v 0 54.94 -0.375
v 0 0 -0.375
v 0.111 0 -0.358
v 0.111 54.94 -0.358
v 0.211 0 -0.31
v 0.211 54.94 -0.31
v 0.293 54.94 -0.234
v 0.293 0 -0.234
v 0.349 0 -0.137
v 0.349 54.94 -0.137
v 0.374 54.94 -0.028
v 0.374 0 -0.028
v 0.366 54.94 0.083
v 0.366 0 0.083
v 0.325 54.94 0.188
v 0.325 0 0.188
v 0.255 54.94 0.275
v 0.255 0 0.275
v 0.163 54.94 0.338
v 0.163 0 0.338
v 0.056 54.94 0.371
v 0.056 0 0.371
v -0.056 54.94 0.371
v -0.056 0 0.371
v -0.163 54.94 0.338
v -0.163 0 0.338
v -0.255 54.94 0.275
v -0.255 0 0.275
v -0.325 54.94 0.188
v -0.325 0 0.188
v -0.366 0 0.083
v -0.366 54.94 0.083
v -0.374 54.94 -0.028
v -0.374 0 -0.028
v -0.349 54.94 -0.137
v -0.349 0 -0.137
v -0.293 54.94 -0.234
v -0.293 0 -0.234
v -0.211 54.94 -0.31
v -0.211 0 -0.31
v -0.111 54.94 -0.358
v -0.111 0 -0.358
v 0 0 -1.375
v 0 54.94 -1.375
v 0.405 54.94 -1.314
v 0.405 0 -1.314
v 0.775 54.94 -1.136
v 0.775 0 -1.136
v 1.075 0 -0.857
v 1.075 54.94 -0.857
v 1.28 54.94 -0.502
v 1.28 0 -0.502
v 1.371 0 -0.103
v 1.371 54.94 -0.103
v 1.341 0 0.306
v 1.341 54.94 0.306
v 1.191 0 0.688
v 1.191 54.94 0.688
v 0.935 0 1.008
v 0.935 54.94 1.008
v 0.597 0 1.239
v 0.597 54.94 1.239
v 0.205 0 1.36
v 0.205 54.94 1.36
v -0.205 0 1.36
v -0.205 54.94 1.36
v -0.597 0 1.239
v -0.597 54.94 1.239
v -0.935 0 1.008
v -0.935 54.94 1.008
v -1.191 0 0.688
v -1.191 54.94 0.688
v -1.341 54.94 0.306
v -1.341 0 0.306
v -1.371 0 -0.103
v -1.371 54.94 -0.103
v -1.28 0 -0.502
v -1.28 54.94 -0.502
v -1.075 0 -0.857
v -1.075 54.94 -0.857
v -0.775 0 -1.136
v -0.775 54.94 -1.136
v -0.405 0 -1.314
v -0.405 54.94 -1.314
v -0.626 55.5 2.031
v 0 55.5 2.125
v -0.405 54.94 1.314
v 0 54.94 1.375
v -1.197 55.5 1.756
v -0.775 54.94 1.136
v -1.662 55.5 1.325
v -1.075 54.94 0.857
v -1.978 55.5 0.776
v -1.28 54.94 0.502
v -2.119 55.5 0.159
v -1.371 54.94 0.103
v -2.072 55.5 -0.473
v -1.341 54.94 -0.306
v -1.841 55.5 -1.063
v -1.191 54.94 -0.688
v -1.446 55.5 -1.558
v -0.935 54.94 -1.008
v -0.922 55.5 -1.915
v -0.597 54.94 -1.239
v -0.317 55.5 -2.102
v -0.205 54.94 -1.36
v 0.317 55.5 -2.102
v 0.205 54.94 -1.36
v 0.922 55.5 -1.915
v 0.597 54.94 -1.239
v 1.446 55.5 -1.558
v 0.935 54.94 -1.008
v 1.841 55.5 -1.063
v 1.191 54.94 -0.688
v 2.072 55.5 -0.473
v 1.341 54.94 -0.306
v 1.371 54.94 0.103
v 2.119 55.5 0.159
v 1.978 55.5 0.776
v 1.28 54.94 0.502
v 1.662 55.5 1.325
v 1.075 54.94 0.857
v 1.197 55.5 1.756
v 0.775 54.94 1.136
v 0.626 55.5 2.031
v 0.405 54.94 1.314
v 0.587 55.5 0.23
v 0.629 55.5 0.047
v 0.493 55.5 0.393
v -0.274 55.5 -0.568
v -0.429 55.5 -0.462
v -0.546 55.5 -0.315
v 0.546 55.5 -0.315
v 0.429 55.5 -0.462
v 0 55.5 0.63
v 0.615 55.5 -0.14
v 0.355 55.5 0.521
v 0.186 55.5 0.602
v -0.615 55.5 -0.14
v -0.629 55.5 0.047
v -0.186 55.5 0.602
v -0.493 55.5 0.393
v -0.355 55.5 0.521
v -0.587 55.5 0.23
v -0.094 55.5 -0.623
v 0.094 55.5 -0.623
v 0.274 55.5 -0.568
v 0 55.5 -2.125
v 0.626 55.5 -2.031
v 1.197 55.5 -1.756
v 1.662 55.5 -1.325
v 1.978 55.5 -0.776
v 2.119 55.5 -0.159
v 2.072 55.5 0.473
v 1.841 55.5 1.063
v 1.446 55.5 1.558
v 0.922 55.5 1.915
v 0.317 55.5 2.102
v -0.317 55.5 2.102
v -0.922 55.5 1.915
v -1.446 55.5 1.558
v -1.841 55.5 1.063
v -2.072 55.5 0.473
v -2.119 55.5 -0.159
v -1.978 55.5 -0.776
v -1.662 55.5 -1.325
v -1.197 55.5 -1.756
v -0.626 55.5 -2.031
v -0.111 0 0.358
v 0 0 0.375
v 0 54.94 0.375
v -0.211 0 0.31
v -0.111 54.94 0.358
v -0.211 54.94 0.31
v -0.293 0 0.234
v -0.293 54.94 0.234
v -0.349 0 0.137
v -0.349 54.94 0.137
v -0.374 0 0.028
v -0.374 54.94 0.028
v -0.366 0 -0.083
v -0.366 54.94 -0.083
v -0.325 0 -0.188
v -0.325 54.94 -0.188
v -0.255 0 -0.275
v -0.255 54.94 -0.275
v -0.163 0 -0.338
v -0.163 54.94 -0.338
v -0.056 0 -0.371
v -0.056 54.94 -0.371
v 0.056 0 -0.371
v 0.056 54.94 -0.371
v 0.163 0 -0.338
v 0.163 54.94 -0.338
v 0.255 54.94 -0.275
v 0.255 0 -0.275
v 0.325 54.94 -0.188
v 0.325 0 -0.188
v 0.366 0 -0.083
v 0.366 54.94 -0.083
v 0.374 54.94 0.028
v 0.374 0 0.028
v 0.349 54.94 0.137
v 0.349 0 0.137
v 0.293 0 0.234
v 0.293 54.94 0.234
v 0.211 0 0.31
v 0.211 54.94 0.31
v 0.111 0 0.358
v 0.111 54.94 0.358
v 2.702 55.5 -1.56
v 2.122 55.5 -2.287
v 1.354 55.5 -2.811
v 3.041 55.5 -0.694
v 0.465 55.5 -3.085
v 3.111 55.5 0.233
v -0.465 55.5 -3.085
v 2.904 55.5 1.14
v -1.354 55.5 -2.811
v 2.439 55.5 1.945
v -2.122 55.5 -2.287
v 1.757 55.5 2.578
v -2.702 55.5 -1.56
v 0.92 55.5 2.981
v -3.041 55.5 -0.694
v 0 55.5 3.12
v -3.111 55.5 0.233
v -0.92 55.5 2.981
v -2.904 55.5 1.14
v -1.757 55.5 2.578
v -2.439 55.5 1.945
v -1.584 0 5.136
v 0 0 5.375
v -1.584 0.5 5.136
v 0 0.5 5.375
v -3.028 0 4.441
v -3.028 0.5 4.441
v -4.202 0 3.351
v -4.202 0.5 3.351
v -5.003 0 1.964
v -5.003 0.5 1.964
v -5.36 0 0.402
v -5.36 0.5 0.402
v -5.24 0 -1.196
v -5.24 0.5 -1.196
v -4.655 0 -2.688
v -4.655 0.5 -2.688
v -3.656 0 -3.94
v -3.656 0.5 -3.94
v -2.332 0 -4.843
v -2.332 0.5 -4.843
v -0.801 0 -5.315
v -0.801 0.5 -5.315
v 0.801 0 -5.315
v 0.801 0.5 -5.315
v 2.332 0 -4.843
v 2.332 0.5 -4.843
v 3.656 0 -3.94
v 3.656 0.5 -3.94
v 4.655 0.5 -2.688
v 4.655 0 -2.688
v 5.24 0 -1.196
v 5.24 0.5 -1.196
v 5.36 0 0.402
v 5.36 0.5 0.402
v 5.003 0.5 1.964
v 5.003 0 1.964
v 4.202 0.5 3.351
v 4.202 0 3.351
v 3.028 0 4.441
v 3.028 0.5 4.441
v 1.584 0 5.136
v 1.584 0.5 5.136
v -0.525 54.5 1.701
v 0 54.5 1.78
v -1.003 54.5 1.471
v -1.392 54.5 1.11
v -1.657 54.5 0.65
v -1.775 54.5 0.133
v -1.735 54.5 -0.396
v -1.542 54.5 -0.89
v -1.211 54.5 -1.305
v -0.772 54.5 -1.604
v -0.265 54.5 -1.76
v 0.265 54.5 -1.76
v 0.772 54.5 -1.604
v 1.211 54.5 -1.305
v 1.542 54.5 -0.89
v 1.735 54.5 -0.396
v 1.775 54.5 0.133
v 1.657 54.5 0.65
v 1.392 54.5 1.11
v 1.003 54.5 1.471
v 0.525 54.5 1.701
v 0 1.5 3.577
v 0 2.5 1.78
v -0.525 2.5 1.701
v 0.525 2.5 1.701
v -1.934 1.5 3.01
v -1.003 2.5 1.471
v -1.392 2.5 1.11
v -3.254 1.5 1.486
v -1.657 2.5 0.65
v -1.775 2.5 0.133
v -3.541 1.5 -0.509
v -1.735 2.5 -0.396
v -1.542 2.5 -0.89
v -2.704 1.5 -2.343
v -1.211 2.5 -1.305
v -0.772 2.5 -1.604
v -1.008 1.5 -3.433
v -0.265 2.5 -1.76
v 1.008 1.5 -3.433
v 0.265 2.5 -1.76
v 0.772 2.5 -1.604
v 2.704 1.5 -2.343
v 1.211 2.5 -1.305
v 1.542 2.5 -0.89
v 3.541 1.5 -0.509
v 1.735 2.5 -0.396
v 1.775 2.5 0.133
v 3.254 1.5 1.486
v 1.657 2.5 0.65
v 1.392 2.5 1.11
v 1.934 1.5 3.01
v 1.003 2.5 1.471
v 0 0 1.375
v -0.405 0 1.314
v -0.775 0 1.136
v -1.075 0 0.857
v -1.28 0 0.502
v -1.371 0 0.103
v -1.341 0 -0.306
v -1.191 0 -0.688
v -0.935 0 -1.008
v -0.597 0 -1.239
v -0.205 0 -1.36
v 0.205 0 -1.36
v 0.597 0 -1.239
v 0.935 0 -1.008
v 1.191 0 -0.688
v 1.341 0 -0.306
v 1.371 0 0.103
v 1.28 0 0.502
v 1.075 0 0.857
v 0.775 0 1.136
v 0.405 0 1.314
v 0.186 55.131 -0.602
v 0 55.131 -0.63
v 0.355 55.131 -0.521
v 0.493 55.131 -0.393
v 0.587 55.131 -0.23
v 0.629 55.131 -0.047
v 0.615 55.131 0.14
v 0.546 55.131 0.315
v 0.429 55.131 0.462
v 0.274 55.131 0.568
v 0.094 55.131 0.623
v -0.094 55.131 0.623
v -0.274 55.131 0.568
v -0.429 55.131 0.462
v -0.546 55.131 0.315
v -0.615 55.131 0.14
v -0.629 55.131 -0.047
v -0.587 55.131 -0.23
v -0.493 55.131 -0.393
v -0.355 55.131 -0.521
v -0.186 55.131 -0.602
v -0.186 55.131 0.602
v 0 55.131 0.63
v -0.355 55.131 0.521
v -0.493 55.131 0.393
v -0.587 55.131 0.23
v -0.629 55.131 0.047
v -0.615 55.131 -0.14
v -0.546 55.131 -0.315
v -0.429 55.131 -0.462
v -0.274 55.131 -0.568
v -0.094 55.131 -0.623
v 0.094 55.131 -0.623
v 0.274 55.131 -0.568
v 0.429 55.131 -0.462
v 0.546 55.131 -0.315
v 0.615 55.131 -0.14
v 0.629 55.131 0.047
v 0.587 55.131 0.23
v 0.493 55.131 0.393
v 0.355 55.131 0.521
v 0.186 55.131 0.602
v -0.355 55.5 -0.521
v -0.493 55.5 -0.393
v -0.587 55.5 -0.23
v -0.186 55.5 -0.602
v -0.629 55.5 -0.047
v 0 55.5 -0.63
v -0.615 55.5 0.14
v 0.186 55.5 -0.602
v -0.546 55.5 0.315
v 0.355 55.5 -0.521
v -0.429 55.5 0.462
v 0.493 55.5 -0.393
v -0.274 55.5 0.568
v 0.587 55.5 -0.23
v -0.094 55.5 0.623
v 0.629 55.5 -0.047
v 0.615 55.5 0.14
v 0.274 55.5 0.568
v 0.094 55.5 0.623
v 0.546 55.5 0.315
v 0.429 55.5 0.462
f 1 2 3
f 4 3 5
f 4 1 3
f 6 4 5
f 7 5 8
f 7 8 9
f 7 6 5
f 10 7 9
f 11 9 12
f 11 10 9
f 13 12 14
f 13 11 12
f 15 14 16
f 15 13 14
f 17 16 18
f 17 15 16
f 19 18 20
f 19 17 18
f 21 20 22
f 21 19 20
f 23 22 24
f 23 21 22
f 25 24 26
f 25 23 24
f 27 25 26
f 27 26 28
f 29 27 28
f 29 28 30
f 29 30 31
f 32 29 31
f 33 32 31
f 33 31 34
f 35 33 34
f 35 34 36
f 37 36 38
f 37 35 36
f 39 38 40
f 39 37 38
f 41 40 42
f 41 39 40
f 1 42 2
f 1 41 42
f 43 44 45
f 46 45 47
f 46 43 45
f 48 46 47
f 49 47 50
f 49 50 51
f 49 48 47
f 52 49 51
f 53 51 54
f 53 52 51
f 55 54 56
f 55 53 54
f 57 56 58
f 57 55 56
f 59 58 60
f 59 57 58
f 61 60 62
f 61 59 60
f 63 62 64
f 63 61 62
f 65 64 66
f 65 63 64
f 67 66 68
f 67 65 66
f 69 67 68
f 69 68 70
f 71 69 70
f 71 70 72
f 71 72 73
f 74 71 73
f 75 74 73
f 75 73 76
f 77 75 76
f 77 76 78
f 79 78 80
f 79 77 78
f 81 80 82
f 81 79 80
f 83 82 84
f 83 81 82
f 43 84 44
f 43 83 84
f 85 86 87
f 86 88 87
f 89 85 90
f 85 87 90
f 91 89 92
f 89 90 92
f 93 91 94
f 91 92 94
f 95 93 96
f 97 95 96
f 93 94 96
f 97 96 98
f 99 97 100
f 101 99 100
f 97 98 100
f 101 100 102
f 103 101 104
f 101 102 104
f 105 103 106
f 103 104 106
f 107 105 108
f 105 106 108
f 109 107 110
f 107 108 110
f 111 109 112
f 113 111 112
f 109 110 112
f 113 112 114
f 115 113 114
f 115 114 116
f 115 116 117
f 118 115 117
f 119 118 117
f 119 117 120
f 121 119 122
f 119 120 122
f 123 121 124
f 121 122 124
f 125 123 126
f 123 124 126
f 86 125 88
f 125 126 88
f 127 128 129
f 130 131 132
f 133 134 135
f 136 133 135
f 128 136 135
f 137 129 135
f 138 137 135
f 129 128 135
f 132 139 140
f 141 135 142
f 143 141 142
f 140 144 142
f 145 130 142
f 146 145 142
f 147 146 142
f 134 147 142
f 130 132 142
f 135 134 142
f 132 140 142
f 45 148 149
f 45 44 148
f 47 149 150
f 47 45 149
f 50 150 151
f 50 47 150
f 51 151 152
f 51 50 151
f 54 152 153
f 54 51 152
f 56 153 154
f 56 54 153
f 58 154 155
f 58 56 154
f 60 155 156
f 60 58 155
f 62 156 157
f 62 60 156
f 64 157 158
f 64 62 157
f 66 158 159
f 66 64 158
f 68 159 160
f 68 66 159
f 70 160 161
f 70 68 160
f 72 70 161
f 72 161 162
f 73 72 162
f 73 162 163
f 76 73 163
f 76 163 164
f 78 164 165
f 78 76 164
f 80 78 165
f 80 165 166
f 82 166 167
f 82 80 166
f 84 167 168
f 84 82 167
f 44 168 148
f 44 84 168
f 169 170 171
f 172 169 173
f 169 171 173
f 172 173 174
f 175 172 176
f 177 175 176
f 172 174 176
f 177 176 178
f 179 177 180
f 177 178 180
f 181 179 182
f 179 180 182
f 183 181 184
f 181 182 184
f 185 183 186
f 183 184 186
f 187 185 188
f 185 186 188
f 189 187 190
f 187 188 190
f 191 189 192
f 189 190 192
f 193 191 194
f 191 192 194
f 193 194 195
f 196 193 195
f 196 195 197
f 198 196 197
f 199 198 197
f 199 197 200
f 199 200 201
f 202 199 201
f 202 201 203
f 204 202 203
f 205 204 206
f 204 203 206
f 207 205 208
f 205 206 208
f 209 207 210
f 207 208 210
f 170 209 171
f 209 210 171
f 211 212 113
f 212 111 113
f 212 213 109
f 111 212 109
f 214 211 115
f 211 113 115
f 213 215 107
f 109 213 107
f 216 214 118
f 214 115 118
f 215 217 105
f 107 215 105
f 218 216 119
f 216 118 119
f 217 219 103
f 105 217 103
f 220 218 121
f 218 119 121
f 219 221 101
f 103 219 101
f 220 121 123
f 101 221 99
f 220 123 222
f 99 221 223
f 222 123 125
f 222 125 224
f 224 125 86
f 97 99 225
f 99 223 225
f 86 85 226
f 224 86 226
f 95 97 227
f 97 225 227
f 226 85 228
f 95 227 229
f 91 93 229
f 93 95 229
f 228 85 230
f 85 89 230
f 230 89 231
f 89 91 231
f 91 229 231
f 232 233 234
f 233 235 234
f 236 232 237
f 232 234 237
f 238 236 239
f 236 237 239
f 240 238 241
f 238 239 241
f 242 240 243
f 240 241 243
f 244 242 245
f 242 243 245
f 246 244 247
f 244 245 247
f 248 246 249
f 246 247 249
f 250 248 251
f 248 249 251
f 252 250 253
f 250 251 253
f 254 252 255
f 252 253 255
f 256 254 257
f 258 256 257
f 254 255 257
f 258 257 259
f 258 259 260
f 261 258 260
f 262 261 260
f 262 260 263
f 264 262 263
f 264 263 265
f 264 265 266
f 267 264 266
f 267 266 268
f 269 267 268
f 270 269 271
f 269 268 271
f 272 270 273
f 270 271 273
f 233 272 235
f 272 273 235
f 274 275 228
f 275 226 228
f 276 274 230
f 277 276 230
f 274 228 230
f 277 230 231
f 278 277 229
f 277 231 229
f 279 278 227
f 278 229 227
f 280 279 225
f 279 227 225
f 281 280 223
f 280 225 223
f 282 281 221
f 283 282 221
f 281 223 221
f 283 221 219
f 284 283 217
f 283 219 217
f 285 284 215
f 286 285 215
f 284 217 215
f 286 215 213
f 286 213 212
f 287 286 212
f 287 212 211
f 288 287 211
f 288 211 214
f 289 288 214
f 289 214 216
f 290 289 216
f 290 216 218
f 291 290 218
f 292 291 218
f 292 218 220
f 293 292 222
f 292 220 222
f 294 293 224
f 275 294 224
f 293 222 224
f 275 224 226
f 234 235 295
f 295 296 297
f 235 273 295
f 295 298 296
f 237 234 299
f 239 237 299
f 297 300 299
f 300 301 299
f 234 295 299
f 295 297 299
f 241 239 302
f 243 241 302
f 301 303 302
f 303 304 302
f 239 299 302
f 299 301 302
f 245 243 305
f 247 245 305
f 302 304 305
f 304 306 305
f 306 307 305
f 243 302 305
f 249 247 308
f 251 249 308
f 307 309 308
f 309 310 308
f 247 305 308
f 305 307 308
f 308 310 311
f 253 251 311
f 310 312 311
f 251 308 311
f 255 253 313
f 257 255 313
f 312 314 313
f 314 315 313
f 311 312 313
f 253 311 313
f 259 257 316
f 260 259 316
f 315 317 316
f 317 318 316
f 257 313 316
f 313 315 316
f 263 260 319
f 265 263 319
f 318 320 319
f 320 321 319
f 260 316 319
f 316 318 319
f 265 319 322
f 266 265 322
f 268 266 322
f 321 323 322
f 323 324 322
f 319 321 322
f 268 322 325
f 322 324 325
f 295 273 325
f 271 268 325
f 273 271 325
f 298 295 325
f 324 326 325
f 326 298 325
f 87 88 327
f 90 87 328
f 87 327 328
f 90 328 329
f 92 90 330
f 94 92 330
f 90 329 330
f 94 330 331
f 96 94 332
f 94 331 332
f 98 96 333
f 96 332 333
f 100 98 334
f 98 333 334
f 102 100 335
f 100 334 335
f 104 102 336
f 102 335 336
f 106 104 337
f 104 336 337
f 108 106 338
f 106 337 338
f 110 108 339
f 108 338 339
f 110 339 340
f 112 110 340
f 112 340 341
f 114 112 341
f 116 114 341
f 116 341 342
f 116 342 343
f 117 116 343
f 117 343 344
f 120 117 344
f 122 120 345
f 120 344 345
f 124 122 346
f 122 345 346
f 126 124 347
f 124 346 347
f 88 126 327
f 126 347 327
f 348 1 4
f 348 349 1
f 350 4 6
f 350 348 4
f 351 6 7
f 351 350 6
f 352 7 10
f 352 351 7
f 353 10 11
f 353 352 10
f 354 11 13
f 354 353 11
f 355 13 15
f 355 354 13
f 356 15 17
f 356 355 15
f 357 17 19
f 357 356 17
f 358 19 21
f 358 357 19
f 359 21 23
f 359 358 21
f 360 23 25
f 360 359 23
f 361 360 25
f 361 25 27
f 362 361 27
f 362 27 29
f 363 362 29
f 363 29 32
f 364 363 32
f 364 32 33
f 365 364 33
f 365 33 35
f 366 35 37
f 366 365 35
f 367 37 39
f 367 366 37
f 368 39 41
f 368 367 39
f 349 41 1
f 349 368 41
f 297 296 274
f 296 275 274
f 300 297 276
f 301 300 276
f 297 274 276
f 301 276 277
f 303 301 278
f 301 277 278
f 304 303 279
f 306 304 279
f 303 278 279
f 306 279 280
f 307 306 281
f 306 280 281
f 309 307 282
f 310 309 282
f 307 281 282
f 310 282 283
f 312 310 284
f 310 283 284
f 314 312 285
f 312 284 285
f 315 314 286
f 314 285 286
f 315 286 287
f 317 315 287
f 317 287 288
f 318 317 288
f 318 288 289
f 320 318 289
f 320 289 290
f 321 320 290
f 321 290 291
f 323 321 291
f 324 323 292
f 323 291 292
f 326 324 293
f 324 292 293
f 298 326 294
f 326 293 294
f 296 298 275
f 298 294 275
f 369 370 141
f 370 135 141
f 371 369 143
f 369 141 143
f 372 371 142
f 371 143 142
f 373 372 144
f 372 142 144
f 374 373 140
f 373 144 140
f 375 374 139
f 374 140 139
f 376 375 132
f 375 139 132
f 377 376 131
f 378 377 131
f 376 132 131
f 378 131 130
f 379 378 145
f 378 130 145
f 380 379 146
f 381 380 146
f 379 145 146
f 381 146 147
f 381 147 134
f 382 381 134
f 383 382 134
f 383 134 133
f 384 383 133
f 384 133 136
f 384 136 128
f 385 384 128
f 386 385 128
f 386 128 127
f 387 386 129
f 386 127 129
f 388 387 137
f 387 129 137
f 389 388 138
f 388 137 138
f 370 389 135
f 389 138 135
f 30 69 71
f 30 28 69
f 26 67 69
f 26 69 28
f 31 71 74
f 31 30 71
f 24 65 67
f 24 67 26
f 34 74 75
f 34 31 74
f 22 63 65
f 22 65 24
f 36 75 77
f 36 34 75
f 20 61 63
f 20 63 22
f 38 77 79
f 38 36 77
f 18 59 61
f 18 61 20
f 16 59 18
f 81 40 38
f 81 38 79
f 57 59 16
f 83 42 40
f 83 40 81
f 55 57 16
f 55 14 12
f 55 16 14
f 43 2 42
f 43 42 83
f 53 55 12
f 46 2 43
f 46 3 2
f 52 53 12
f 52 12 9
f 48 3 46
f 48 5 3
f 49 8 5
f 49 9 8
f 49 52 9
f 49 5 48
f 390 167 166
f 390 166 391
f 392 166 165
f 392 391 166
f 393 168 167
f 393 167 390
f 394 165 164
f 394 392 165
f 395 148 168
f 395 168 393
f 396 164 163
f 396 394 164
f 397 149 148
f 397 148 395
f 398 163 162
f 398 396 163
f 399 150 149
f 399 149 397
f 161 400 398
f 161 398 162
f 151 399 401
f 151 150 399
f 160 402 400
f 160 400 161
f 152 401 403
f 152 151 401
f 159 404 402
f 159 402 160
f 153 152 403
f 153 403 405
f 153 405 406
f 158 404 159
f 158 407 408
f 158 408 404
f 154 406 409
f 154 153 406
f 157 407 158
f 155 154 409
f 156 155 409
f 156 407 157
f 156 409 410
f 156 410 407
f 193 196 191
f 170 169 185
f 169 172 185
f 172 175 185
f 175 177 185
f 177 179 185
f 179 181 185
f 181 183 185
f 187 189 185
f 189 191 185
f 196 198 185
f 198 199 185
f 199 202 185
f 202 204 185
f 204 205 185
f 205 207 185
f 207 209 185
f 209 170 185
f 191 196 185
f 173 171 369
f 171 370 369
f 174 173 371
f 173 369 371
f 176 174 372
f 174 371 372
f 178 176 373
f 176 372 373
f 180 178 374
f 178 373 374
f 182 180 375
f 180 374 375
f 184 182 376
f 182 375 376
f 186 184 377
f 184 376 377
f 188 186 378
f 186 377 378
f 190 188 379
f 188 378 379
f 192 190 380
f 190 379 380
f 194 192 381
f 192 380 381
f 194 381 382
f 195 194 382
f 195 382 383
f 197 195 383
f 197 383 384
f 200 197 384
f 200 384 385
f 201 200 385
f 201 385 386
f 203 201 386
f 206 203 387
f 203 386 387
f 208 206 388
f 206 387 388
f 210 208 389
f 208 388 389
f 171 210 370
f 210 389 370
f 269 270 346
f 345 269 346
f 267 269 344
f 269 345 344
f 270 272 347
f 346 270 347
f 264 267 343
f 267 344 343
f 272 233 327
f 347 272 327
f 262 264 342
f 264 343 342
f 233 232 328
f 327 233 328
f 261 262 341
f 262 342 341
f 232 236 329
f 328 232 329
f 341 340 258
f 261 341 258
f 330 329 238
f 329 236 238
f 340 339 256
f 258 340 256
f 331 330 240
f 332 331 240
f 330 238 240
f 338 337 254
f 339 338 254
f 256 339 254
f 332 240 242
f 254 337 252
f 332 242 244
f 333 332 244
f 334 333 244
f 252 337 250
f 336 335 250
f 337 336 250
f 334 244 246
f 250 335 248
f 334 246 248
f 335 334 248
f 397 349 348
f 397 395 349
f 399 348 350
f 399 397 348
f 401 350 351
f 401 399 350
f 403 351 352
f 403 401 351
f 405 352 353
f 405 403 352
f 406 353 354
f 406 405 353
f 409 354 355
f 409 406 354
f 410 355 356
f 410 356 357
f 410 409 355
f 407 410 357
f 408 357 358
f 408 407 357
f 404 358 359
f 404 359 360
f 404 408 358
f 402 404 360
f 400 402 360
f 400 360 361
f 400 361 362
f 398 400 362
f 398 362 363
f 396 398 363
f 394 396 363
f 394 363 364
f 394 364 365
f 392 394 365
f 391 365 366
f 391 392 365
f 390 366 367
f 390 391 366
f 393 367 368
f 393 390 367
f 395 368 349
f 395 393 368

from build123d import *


with BuildPart() as part:
    # Croquis1 → Revolución1 (revolve)
    with BuildSketch(Plane.XY, mode=Mode.PRIVATE) as revoluci_n1_sk:
        Polygon((5.375, 0), (5.375, 0.5), (1.78, 2.5), (1.78, 54.5), (3.11963605, 55.5), (2.12525, 55.5), (1.375, 54.939959831), (1.375, 0), align=None)
        Polygon((0.375, 0), (0.375, 54.939959831), (0.630483851, 55.130671219), (0.630483851, 55.5), (0, 55.5), (0, 0), align=None)
    revolve(revoluci_n1_sk.sketch.rotate(Axis((0, 55.5, 0), (0, -1, 0)), 90), axis=Axis((0, 55.5, 0), (0, -1, 0)))


with BuildPart() as body_2:
    # Croquis3 → Revolución2 (revolve)
    with BuildSketch(Plane.XY, mode=Mode.PRIVATE) as revoluci_n2_sk:
        Polygon((0.375, 54.939959831), (0.630483851, 55.130671219), (0.630483851, 55.5), (2.12525, 55.5), (1.375, 54.939959831), (1.375, 0), (0.375, 0), align=None)
    revolve(revoluci_n2_sk.sketch.rotate(Axis((0, 55.5, 0), (0, -1, 0)), 270), axis=Axis((0, 55.5, 0), (0, -1, 0)))


solid = Compound([part.part, body_2.part])
